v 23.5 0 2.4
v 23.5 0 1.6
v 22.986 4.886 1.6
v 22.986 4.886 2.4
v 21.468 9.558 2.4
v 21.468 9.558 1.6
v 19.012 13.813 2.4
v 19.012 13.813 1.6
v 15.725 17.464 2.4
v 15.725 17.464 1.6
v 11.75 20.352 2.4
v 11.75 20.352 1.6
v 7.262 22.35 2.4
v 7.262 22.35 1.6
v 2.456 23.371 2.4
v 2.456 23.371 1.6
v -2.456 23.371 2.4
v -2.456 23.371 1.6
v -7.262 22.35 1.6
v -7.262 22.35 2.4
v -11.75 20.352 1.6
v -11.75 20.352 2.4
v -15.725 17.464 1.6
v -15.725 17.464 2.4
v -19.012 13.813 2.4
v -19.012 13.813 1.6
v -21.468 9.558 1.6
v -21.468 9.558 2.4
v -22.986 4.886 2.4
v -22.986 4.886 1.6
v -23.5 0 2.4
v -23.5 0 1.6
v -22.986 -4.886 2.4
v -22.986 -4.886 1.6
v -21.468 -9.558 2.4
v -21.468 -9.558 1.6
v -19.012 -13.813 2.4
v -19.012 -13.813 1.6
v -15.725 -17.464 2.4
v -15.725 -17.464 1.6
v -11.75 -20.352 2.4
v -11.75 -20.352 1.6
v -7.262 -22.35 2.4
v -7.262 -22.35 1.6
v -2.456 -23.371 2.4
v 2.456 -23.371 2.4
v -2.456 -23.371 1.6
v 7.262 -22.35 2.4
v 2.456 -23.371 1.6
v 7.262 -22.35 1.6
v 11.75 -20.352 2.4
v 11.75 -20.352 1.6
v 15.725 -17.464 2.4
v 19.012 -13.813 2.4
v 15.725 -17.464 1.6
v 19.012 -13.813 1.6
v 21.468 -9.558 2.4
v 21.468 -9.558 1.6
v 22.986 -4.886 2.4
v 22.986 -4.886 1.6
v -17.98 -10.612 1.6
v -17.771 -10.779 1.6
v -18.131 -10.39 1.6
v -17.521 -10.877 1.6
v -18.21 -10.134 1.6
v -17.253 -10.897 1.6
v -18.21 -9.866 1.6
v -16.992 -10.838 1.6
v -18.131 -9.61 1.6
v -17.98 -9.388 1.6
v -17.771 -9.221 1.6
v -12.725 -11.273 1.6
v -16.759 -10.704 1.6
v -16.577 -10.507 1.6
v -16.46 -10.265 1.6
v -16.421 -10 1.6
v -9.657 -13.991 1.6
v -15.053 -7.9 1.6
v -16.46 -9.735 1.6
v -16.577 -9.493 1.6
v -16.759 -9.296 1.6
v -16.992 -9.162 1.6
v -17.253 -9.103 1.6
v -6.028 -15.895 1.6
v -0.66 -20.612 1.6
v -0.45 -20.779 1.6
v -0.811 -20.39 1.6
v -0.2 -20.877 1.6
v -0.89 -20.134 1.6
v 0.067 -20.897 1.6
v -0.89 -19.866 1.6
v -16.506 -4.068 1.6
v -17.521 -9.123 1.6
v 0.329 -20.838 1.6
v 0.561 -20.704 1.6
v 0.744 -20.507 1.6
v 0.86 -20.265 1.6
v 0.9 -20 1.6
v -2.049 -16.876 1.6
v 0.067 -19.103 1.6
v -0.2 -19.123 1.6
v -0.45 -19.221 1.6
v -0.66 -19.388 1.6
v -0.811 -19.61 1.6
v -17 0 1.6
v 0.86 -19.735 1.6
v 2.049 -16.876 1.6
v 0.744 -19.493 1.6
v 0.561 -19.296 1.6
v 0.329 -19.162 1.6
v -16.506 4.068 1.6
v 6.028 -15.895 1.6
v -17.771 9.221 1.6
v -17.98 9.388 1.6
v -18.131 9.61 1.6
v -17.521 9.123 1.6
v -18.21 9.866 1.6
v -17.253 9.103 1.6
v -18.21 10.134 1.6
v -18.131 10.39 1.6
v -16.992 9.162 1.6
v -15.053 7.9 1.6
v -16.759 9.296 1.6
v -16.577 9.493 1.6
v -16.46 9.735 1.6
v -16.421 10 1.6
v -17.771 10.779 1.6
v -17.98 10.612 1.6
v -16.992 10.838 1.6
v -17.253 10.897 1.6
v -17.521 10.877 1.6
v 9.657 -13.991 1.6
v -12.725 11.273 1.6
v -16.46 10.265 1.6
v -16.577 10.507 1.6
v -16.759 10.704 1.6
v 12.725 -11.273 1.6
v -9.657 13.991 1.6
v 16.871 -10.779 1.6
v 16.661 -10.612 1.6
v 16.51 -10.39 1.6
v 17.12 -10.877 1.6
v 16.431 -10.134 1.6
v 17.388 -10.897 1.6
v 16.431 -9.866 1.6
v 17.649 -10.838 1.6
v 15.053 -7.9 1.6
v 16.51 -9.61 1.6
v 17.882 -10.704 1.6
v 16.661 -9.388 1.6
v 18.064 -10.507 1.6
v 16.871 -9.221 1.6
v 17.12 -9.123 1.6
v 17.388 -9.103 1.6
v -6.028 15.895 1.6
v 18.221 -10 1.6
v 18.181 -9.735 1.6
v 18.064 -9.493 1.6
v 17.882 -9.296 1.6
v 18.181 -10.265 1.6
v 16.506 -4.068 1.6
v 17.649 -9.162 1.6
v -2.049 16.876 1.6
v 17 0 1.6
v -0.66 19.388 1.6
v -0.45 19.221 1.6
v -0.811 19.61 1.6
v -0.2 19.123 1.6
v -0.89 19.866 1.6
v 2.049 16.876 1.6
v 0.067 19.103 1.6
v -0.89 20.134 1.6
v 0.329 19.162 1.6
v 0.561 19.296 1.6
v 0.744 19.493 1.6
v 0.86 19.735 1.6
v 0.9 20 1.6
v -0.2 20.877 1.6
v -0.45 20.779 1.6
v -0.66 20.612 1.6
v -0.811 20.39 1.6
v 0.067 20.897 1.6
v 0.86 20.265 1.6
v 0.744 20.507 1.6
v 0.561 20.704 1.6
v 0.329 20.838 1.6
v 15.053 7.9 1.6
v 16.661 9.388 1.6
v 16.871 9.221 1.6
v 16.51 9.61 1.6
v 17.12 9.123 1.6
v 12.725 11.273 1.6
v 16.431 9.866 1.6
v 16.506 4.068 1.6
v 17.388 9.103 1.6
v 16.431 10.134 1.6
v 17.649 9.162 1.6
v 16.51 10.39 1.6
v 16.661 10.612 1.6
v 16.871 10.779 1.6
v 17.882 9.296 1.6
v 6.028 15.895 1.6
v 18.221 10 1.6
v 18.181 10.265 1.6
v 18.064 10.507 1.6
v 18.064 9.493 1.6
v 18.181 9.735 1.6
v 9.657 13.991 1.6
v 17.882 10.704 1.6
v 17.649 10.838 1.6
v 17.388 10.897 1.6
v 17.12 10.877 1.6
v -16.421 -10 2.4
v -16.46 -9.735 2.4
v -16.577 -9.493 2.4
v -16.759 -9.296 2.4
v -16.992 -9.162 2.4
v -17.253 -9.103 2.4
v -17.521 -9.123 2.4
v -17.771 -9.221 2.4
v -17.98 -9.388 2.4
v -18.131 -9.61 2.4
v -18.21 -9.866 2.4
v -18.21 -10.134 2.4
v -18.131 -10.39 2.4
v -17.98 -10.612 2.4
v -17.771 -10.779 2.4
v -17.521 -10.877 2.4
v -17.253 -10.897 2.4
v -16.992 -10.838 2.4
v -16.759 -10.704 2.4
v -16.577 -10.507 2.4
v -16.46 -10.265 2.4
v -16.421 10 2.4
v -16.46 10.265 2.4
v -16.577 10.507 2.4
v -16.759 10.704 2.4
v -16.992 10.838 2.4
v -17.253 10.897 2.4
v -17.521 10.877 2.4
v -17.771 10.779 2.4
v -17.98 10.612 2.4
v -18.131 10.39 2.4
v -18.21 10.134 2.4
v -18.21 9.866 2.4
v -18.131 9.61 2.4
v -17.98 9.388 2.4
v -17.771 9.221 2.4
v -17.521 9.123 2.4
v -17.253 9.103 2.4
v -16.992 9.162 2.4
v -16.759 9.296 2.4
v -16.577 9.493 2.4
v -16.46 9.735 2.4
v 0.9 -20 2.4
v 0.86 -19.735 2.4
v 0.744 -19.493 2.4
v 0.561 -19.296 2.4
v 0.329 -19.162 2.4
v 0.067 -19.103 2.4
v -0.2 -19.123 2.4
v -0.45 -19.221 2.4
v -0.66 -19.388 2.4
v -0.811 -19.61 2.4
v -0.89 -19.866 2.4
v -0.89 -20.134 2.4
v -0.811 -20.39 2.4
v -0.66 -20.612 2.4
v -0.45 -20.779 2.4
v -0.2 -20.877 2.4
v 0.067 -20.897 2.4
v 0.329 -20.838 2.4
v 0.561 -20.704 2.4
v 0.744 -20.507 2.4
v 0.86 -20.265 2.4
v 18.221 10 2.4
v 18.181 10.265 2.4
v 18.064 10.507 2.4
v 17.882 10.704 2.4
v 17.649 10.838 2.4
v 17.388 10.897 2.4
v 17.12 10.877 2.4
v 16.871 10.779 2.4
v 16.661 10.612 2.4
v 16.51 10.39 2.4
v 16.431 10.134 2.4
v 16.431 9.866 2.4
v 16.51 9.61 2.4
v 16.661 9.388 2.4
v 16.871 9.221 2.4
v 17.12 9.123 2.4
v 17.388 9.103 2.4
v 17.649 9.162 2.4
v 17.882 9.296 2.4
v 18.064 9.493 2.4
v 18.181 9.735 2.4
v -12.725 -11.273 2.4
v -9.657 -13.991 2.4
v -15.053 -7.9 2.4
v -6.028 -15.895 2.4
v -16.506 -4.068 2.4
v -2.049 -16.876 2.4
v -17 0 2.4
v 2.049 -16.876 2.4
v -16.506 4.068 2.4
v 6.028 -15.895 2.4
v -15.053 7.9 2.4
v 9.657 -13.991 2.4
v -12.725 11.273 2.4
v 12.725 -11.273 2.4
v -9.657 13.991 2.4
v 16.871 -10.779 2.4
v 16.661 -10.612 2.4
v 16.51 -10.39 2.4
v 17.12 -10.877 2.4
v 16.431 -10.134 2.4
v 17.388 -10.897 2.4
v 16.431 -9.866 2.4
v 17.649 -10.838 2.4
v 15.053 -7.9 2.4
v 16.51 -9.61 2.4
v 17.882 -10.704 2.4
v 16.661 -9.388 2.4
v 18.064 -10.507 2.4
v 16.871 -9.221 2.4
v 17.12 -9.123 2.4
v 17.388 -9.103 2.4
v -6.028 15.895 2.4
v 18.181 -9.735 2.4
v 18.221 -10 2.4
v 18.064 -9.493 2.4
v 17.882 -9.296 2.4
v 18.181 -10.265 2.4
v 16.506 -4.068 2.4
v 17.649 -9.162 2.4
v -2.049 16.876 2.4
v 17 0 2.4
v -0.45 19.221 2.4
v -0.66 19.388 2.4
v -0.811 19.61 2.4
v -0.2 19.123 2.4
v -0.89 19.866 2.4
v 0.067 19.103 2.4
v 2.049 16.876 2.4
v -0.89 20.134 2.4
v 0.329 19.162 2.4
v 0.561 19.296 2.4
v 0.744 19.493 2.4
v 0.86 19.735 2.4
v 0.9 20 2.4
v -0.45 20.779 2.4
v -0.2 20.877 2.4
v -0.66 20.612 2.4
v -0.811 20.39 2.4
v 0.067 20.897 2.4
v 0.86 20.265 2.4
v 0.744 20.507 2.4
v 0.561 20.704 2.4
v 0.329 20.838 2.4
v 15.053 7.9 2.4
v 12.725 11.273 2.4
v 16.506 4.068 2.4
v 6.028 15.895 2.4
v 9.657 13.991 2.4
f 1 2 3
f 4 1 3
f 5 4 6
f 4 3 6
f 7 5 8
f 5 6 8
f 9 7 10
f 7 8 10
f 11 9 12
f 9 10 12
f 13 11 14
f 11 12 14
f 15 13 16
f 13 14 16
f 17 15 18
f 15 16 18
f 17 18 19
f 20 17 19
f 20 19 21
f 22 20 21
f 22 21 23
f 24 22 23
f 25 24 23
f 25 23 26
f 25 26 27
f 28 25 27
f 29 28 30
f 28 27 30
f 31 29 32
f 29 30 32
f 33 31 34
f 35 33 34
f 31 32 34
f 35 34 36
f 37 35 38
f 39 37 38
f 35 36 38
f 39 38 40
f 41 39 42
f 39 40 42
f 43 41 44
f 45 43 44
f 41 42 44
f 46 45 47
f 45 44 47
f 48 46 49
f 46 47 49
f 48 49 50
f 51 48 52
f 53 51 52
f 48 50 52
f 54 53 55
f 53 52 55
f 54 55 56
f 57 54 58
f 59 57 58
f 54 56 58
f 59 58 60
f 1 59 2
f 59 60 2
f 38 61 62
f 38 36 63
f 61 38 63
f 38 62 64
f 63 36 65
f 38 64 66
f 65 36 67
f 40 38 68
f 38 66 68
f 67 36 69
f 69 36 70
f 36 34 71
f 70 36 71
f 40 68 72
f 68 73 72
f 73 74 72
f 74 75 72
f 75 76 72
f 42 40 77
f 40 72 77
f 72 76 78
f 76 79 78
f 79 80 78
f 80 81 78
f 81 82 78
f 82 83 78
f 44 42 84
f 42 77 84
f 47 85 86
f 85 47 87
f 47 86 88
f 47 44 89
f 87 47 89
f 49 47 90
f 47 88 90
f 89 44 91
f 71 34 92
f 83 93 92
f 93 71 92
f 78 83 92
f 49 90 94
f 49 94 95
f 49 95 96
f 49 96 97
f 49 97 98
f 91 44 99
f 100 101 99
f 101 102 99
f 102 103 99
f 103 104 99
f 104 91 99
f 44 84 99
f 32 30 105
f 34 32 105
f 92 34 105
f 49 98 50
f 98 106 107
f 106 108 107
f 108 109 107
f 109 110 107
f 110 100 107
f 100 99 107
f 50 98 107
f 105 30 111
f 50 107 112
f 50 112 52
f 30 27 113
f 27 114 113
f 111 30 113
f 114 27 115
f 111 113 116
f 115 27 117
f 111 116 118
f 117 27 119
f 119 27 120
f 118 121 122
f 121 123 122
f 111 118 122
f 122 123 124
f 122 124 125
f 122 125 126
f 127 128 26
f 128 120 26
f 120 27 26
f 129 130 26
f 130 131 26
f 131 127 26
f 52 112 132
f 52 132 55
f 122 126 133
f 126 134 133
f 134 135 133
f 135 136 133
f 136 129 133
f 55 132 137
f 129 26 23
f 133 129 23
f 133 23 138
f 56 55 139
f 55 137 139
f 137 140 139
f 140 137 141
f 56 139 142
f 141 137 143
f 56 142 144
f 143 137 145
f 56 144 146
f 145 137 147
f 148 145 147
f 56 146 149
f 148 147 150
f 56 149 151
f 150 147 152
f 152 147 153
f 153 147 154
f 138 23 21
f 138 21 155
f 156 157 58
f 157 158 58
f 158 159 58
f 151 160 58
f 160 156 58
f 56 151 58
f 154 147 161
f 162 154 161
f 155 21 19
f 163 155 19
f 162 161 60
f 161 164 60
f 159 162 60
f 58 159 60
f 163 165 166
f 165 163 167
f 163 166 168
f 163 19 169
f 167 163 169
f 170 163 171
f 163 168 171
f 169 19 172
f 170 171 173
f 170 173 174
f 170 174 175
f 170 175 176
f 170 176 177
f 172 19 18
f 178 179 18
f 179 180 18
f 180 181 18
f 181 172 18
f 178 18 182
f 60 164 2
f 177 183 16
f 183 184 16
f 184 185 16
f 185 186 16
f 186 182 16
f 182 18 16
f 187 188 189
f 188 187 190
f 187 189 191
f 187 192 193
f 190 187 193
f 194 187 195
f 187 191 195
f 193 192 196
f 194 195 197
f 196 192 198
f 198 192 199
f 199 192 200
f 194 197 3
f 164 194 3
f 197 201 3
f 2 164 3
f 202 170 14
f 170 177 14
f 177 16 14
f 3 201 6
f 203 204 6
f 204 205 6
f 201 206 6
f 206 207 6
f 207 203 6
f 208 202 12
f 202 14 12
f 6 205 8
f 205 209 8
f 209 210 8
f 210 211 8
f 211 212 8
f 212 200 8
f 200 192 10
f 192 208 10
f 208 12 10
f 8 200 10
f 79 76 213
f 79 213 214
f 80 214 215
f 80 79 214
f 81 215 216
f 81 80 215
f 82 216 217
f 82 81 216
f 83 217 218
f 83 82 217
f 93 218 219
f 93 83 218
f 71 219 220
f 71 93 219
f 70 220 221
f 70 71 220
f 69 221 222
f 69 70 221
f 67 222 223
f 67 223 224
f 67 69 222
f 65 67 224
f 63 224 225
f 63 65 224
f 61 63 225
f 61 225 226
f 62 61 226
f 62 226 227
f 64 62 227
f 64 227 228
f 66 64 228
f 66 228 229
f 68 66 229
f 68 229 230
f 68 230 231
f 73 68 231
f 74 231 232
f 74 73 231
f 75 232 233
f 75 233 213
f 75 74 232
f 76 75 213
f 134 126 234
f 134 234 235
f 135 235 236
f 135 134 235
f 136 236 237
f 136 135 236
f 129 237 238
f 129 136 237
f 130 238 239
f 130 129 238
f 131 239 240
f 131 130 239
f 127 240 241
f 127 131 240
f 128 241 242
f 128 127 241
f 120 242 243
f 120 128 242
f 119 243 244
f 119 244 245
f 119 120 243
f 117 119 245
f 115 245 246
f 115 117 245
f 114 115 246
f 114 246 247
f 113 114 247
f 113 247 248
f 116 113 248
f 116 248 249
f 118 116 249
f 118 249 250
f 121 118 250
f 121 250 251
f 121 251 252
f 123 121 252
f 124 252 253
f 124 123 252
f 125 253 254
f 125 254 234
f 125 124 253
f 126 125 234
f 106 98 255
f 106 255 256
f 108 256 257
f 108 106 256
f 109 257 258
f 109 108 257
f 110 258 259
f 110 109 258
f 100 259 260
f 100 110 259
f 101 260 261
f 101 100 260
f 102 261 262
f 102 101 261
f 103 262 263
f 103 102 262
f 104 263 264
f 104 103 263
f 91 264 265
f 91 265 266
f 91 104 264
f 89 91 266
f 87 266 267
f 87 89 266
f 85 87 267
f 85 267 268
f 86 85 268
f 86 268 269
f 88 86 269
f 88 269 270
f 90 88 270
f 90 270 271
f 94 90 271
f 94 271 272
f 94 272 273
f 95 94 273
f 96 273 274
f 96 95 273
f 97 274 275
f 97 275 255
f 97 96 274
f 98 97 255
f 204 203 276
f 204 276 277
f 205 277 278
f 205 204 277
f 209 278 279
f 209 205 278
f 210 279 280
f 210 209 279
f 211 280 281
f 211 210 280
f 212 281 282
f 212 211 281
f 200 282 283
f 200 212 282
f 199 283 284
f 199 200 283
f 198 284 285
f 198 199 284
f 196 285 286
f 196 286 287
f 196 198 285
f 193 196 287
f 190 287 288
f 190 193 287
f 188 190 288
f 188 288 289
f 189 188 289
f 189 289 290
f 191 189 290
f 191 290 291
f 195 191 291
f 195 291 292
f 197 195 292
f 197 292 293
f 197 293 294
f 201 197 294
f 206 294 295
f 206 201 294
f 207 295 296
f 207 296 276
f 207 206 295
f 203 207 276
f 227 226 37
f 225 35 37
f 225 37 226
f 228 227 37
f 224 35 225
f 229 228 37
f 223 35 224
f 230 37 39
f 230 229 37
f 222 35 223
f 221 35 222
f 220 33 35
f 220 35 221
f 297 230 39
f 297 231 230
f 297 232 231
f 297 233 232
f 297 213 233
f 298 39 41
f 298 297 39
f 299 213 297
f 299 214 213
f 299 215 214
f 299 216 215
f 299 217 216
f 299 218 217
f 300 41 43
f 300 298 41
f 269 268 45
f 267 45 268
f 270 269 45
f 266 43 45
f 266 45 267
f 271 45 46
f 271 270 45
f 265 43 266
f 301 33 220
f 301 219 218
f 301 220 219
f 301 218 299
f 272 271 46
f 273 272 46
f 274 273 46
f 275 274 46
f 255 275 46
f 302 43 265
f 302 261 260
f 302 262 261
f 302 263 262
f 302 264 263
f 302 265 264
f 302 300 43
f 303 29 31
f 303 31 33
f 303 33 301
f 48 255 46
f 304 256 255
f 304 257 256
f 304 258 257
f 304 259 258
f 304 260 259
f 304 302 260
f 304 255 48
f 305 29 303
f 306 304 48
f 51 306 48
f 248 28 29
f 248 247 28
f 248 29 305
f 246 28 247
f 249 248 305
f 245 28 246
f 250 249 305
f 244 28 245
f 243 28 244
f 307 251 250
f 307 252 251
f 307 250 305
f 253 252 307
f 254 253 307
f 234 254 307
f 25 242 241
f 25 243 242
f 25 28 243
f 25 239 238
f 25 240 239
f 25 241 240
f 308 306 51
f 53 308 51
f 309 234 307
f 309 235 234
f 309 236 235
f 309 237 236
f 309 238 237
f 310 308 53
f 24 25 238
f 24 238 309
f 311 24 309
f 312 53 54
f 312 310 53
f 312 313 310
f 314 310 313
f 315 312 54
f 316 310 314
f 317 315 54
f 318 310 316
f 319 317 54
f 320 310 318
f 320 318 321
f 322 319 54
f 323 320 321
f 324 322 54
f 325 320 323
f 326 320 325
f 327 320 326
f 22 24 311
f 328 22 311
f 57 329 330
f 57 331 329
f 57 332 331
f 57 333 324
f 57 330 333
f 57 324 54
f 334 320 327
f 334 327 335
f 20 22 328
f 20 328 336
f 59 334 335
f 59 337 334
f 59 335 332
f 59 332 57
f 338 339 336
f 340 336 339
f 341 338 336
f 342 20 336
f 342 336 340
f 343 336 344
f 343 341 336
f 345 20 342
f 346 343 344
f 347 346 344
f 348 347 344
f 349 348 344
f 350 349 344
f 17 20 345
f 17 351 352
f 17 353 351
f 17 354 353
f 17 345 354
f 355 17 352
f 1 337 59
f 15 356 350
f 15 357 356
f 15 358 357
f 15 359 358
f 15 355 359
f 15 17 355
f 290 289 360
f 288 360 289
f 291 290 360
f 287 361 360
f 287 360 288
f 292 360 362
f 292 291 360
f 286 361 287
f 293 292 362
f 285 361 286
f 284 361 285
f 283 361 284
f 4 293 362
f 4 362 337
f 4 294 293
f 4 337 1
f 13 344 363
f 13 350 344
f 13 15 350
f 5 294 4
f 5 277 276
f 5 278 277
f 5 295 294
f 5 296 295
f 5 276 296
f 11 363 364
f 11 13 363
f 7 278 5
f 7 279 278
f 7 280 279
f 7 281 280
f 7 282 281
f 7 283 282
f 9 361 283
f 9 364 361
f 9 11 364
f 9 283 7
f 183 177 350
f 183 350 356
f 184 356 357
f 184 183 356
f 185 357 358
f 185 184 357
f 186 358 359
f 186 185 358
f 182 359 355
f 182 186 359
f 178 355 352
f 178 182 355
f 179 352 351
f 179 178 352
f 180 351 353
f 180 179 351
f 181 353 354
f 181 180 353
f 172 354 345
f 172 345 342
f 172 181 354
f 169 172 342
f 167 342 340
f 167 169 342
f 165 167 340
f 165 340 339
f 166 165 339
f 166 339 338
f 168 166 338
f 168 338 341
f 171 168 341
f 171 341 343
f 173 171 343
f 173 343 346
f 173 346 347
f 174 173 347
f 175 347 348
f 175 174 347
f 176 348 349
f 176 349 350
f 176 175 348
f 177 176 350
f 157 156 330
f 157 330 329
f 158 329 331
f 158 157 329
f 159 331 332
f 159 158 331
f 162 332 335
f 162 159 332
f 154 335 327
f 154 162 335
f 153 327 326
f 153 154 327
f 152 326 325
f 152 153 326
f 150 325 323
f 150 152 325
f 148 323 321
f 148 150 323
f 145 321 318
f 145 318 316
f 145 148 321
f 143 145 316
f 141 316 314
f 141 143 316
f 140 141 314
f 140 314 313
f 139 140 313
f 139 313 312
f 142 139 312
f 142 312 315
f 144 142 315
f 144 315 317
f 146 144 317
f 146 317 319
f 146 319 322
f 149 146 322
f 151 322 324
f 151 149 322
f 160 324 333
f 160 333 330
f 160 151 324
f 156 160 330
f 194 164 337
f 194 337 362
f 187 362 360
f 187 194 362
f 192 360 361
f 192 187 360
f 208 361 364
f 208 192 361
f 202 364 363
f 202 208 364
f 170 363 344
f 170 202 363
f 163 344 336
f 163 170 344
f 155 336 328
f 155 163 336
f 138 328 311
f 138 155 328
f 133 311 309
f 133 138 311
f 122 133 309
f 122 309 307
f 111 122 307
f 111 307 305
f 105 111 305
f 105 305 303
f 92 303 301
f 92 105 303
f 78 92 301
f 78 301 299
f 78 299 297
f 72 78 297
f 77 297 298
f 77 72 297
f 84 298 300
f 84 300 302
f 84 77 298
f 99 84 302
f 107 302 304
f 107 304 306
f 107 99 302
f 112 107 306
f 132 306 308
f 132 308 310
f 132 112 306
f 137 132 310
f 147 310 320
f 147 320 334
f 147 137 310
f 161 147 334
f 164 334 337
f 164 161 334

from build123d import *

# Parameters (mm, degrees)
SKETCH_1_R      = 117.5
SKETCH_1_R_2    = 85
SKETCH_1_R_3    = 4.5
EXTRUDE_1_DEPTH = 4
SCALE_1_SCALE   = 0.2


with BuildPart() as part:
    # 草图1 → 凸台-拉伸1 (new body)
    with BuildSketch(Plane.XY):
        Circle(SKETCH_1_R)
        Circle(SKETCH_1_R_2, mode=Mode.SUBTRACT)
        with Locations((0, 100)):
            Circle(SKETCH_1_R_3, mode=Mode.SUBTRACT)
        with Locations((86.602540378, 50)):
            Circle(SKETCH_1_R_3, mode=Mode.SUBTRACT)
        with Locations((86.602540378, -50)):
            Circle(SKETCH_1_R_3, mode=Mode.SUBTRACT)
        with Locations((0, -100)):
            Circle(SKETCH_1_R_3, mode=Mode.SUBTRACT)
        with Locations((-86.602540378, -50)):
            Circle(SKETCH_1_R_3, mode=Mode.SUBTRACT)
        with Locations((-86.602540378, 50)):
            Circle(SKETCH_1_R_3, mode=Mode.SUBTRACT)
    extrude(amount=EXTRUDE_1_DEPTH)


with BuildPart() as part_1:
    # 缩放比例1: scaled about (0, 0, 2)
    add(part.part.scale(SCALE_1_SCALE).moved(Location((0, 0, 1.6))))


solid = part_1.part
